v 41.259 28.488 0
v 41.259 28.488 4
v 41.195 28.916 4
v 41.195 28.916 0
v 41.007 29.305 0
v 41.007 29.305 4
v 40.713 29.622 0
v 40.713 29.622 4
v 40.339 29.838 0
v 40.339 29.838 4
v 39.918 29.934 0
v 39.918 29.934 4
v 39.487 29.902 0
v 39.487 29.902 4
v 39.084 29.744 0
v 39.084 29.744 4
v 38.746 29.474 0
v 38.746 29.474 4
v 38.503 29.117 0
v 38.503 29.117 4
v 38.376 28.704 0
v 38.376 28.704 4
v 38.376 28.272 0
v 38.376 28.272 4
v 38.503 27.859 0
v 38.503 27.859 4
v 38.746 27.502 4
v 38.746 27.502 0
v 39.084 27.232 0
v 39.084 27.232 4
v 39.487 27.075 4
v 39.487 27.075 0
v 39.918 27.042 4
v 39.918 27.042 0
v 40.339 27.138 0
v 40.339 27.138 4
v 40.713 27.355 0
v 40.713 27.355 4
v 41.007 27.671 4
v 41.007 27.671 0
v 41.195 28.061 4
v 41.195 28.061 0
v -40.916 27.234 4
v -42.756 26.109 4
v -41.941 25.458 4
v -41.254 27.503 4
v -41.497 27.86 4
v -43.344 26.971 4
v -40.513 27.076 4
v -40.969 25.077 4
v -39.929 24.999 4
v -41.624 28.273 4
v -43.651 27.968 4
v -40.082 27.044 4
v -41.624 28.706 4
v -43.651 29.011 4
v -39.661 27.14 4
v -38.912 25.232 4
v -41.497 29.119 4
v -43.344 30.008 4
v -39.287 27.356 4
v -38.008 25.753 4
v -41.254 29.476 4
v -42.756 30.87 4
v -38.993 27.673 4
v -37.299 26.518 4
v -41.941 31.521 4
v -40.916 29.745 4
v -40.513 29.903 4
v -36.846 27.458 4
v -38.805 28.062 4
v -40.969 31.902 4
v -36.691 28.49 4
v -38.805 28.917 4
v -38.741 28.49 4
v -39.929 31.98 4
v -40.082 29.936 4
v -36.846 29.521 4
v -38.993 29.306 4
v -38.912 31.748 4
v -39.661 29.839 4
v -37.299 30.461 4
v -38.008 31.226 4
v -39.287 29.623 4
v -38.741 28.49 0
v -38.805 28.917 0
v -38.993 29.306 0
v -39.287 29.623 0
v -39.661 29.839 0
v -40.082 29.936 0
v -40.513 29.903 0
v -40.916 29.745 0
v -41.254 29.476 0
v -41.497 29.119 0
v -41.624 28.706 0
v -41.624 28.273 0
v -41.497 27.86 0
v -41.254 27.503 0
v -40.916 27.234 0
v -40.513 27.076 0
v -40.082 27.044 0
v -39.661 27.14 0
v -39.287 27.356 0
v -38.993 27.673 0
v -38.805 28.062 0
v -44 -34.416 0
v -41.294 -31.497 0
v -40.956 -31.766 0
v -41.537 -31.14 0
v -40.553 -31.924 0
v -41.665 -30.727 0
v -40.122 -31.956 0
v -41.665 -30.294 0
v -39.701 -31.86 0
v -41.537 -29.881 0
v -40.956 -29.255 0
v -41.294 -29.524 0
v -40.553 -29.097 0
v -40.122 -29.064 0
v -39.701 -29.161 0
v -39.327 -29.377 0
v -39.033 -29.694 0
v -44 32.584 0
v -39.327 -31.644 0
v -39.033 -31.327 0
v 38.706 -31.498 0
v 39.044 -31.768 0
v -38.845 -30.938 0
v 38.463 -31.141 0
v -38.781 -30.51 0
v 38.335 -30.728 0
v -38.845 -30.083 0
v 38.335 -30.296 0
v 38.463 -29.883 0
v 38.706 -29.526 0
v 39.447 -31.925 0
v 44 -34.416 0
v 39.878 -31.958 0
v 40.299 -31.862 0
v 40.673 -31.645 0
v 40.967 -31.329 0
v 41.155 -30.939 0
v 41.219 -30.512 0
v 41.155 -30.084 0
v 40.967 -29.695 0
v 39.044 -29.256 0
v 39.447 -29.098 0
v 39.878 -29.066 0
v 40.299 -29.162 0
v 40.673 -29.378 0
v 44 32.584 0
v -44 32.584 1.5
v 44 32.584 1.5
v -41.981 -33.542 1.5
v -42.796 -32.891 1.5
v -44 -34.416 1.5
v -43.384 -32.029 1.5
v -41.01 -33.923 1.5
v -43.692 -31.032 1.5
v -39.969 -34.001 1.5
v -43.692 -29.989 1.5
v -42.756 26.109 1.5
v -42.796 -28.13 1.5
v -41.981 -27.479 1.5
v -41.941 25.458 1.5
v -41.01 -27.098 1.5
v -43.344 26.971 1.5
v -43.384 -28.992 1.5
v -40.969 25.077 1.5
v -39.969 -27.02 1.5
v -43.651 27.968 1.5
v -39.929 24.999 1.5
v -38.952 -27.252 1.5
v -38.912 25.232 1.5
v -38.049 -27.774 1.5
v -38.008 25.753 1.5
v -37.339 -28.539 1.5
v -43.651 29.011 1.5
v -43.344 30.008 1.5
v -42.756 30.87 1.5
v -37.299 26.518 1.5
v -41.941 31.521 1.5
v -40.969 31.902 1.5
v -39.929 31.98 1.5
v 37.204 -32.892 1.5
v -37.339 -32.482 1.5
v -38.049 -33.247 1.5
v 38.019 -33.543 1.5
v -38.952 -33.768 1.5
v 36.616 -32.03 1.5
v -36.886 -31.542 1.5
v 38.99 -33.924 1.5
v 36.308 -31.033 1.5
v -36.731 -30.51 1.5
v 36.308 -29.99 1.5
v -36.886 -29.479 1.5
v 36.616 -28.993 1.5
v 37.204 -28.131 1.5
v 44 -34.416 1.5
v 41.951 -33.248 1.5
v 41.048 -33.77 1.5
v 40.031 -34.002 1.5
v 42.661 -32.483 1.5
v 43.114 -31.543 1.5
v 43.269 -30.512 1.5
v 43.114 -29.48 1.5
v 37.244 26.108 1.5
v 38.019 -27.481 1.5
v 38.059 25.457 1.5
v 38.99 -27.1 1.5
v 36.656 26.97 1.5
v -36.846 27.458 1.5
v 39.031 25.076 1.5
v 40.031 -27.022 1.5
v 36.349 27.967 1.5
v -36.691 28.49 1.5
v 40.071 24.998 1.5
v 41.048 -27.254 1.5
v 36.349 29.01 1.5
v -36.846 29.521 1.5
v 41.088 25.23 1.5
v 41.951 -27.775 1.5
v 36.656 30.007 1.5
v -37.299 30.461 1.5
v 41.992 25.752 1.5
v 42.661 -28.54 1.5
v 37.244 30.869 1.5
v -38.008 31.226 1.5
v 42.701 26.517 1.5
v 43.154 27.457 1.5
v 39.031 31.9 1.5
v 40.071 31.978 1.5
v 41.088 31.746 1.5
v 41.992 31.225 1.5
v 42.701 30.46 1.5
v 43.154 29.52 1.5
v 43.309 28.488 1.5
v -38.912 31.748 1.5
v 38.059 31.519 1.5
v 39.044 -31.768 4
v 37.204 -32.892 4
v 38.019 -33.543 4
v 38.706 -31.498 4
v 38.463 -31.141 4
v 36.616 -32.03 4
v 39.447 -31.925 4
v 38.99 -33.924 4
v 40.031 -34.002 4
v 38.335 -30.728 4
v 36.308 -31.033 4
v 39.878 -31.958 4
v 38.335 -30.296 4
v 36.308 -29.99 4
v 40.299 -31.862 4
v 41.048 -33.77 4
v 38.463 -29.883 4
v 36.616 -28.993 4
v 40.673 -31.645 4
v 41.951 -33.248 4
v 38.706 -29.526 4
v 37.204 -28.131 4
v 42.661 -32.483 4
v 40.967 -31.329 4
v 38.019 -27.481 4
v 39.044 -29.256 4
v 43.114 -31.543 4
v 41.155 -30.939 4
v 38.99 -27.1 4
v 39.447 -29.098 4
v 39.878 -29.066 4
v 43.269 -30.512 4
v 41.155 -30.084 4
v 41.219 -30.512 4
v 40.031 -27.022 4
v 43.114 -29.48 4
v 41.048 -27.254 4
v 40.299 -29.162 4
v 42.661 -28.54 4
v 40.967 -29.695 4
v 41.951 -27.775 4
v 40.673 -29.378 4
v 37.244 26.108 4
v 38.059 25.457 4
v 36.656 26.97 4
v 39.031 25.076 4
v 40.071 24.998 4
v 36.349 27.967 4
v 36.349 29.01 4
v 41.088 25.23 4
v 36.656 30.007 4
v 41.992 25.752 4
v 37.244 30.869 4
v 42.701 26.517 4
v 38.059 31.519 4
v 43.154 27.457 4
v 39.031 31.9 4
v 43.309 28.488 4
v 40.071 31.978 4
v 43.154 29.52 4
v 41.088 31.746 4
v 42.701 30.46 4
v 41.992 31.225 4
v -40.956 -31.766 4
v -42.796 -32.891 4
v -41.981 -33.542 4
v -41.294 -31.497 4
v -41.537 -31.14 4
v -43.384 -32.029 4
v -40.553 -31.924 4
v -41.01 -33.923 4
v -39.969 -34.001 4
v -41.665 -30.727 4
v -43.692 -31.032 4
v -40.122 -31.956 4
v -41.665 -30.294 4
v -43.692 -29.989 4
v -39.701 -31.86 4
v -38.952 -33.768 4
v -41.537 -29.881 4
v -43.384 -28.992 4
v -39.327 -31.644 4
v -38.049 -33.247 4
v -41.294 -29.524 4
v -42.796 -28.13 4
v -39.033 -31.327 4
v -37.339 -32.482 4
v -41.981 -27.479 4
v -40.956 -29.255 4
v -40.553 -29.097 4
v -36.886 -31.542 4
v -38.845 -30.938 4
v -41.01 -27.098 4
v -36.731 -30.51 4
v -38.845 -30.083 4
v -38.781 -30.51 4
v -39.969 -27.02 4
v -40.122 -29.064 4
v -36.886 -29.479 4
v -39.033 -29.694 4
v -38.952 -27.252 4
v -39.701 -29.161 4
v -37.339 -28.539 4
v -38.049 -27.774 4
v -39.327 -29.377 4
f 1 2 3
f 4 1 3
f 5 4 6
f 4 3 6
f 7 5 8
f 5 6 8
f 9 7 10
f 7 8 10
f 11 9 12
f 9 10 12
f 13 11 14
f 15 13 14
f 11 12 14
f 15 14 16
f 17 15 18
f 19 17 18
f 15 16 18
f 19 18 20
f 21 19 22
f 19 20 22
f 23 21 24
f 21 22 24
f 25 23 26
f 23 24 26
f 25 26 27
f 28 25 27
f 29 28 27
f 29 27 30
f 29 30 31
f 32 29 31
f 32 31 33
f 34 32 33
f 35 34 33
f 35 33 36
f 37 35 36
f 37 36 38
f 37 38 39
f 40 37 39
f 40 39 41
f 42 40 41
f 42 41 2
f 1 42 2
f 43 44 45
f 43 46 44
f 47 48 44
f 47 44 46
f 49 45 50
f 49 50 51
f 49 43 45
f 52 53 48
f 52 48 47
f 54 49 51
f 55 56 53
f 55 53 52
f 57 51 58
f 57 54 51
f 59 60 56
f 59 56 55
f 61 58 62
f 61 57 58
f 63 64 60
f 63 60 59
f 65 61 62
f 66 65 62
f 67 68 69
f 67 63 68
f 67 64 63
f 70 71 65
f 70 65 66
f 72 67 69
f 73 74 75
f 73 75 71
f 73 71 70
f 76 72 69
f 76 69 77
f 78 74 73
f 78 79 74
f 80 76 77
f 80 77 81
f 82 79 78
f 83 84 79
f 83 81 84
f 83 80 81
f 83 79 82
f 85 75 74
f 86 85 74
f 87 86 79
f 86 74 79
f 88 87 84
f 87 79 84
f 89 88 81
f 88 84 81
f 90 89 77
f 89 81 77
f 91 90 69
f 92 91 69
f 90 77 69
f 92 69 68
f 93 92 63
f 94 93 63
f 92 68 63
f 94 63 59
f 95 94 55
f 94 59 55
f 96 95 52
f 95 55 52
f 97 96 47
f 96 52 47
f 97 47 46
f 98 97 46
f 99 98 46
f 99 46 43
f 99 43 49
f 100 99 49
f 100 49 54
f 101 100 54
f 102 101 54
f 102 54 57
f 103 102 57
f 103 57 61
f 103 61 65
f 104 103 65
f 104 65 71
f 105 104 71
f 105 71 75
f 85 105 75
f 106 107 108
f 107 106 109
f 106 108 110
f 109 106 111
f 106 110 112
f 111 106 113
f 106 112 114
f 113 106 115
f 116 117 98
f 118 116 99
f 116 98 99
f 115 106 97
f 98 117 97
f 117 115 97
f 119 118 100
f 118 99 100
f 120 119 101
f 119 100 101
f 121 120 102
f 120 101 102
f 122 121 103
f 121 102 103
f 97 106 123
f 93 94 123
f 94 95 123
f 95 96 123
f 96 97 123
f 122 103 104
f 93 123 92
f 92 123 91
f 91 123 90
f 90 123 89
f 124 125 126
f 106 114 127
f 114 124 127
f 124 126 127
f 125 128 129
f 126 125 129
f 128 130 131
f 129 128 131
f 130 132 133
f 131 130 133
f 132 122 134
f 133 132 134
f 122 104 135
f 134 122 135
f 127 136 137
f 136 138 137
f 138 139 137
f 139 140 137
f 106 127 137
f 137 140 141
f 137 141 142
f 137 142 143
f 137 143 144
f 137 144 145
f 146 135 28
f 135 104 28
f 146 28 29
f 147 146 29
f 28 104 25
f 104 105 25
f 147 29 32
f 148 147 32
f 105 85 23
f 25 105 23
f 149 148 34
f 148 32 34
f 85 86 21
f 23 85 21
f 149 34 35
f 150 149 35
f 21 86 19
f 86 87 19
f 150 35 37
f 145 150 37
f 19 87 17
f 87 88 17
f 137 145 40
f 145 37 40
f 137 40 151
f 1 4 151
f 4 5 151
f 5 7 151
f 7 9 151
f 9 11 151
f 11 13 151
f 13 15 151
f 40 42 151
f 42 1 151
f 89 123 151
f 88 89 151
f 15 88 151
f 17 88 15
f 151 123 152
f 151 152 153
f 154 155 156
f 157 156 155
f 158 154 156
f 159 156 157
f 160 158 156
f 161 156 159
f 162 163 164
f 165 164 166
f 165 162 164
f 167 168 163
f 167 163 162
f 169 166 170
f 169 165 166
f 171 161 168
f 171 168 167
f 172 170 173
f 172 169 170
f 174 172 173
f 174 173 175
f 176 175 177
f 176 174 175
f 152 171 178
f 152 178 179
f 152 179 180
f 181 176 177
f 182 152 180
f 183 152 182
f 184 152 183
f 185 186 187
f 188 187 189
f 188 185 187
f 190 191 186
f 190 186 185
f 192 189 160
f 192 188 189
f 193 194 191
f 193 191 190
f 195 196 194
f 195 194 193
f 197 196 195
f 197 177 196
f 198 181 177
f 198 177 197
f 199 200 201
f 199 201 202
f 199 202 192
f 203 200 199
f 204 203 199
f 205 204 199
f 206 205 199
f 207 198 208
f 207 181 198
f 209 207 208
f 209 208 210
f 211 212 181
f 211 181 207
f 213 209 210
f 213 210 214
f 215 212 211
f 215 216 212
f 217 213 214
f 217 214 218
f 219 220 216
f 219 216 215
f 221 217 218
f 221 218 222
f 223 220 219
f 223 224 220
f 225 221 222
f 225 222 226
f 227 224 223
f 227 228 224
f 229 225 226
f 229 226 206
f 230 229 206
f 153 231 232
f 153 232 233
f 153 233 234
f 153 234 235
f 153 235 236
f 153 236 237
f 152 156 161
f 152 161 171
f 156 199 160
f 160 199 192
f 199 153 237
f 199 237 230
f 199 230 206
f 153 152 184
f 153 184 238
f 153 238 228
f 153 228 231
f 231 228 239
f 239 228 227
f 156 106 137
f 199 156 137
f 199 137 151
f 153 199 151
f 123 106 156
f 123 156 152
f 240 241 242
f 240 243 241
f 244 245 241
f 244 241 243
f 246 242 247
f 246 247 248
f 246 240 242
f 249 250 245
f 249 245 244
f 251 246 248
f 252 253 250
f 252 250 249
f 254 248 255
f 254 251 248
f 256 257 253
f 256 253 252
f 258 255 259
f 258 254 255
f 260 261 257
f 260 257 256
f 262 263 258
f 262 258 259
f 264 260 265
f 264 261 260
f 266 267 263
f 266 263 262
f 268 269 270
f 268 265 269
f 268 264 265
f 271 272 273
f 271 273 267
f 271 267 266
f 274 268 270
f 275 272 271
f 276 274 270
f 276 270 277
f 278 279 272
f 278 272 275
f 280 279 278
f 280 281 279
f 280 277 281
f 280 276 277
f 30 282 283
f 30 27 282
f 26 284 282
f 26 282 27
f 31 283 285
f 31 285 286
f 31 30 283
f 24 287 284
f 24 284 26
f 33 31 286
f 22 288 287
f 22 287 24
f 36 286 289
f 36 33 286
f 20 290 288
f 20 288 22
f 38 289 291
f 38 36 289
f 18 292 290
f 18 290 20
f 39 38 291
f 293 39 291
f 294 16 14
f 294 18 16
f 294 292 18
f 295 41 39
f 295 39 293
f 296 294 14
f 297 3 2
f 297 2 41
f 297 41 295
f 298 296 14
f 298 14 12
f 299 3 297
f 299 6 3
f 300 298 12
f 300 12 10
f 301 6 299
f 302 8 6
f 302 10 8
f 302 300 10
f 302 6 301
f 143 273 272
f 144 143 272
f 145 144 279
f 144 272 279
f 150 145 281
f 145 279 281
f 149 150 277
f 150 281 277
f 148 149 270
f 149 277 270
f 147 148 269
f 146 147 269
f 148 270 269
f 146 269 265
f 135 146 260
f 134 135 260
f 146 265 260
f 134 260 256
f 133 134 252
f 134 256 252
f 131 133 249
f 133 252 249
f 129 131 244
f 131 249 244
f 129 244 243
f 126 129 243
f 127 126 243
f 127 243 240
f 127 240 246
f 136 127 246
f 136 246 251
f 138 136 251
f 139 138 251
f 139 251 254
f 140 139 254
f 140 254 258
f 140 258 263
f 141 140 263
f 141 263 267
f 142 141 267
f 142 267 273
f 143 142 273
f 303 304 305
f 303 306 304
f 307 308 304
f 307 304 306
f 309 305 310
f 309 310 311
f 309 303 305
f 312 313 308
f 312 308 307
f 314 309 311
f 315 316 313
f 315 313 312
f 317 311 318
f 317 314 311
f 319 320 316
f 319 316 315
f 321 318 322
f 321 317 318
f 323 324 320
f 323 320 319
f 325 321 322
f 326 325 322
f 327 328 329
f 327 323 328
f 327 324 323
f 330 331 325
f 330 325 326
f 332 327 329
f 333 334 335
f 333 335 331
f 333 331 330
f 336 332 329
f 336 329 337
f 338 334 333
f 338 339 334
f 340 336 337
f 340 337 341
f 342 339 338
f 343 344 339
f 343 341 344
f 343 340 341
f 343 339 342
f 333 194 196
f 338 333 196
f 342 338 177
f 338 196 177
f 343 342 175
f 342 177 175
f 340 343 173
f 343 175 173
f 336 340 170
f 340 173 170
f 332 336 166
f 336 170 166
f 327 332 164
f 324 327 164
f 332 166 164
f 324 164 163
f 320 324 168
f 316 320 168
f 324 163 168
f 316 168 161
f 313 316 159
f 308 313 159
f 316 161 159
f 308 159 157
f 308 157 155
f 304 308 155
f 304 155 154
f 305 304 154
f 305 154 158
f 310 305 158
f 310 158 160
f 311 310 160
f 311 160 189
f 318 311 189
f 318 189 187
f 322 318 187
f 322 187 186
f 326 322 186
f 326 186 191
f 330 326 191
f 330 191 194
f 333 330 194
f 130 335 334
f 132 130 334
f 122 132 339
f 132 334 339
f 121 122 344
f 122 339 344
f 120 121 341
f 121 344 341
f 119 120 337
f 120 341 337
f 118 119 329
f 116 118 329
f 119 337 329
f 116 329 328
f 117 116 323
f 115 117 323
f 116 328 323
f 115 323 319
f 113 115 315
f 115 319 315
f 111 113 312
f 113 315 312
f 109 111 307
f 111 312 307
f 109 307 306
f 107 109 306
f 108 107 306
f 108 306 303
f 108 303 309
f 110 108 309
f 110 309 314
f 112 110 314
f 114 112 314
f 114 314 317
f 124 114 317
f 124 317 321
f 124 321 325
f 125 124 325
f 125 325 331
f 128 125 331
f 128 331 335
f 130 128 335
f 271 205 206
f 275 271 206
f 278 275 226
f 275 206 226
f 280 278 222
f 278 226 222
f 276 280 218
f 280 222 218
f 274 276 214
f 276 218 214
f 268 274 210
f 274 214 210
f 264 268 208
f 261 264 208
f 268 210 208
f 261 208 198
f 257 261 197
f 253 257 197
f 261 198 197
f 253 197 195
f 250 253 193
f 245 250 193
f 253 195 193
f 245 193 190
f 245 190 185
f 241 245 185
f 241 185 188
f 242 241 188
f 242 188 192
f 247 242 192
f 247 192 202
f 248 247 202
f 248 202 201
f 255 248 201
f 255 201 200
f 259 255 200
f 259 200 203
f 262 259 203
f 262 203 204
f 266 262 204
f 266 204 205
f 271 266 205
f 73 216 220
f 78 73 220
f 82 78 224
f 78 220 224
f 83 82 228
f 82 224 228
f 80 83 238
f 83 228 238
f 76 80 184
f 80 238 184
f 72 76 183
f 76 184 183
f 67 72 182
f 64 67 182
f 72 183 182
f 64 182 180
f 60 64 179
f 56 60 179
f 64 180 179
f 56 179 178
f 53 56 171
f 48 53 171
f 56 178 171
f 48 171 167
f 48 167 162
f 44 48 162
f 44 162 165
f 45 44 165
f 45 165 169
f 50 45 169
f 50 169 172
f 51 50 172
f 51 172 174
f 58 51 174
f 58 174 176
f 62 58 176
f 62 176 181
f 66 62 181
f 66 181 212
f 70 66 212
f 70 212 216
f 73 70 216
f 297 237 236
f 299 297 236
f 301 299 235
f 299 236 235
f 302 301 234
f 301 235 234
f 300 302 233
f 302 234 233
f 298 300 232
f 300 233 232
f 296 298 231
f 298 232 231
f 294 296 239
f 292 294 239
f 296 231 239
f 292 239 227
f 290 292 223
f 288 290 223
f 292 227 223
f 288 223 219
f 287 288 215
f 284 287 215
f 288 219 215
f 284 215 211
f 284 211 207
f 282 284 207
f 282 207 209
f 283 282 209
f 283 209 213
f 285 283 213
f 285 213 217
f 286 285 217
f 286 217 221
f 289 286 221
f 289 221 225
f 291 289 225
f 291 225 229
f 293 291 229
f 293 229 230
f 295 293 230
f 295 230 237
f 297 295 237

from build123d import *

# Parameters (mm, degrees)
F0_W     = 88
F0_H     = 67
F1_DEPTH = 1.5
F2_R     = 3.5
F3_DEPTH = 4
F4_R     = 1.45
F5_R     = 1.45
F6_R     = 1.45
F7_R     = 1.45
F8_DEPTH = 5


with BuildPart() as f1:
    # F0 (on Top) → F1 (new body)
    with BuildSketch(Plane.XY):
        with Locations((0, -0.916107)):
            Rectangle(F0_W, F0_H)
    extrude(amount=F1_DEPTH)

    # F2 (on face) → F3 (join)
    with BuildSketch(Plane.XY):
        with Locations((-40.190587, 28.489581)):
            Circle(F2_R)
        with Locations((39.809413, 28.488207)):
            Circle(F2_R)
        with Locations((-40.23079, -30.510419)):
            Circle(F2_R)
        with Locations((39.76921, -30.511793)):
            Circle(F2_R)
    extrude(amount=F3_DEPTH)

    # F4 (on face) + F5 (on face) + F6 (on face) + F7 (on face) → F8 (cut)
    with BuildSketch(Plane.XY.offset(4)):
        with Locations((-40.23079, -30.510419)):
            Circle(F4_R)
    with BuildSketch(Plane.XY.offset(4)):
        with Locations((-40.190587, 28.489581)):
            Circle(F5_R)
    with BuildSketch(Plane.XY.offset(4)):
        with Locations((39.76921, -30.511793)):
            Circle(F6_R)
    with BuildSketch(Plane.XY.offset(4)):
        with Locations((39.809413, 28.488207)):
            Circle(F7_R)
    extrude(amount=-F8_DEPTH, mode=Mode.SUBTRACT)


solid = f1.part
